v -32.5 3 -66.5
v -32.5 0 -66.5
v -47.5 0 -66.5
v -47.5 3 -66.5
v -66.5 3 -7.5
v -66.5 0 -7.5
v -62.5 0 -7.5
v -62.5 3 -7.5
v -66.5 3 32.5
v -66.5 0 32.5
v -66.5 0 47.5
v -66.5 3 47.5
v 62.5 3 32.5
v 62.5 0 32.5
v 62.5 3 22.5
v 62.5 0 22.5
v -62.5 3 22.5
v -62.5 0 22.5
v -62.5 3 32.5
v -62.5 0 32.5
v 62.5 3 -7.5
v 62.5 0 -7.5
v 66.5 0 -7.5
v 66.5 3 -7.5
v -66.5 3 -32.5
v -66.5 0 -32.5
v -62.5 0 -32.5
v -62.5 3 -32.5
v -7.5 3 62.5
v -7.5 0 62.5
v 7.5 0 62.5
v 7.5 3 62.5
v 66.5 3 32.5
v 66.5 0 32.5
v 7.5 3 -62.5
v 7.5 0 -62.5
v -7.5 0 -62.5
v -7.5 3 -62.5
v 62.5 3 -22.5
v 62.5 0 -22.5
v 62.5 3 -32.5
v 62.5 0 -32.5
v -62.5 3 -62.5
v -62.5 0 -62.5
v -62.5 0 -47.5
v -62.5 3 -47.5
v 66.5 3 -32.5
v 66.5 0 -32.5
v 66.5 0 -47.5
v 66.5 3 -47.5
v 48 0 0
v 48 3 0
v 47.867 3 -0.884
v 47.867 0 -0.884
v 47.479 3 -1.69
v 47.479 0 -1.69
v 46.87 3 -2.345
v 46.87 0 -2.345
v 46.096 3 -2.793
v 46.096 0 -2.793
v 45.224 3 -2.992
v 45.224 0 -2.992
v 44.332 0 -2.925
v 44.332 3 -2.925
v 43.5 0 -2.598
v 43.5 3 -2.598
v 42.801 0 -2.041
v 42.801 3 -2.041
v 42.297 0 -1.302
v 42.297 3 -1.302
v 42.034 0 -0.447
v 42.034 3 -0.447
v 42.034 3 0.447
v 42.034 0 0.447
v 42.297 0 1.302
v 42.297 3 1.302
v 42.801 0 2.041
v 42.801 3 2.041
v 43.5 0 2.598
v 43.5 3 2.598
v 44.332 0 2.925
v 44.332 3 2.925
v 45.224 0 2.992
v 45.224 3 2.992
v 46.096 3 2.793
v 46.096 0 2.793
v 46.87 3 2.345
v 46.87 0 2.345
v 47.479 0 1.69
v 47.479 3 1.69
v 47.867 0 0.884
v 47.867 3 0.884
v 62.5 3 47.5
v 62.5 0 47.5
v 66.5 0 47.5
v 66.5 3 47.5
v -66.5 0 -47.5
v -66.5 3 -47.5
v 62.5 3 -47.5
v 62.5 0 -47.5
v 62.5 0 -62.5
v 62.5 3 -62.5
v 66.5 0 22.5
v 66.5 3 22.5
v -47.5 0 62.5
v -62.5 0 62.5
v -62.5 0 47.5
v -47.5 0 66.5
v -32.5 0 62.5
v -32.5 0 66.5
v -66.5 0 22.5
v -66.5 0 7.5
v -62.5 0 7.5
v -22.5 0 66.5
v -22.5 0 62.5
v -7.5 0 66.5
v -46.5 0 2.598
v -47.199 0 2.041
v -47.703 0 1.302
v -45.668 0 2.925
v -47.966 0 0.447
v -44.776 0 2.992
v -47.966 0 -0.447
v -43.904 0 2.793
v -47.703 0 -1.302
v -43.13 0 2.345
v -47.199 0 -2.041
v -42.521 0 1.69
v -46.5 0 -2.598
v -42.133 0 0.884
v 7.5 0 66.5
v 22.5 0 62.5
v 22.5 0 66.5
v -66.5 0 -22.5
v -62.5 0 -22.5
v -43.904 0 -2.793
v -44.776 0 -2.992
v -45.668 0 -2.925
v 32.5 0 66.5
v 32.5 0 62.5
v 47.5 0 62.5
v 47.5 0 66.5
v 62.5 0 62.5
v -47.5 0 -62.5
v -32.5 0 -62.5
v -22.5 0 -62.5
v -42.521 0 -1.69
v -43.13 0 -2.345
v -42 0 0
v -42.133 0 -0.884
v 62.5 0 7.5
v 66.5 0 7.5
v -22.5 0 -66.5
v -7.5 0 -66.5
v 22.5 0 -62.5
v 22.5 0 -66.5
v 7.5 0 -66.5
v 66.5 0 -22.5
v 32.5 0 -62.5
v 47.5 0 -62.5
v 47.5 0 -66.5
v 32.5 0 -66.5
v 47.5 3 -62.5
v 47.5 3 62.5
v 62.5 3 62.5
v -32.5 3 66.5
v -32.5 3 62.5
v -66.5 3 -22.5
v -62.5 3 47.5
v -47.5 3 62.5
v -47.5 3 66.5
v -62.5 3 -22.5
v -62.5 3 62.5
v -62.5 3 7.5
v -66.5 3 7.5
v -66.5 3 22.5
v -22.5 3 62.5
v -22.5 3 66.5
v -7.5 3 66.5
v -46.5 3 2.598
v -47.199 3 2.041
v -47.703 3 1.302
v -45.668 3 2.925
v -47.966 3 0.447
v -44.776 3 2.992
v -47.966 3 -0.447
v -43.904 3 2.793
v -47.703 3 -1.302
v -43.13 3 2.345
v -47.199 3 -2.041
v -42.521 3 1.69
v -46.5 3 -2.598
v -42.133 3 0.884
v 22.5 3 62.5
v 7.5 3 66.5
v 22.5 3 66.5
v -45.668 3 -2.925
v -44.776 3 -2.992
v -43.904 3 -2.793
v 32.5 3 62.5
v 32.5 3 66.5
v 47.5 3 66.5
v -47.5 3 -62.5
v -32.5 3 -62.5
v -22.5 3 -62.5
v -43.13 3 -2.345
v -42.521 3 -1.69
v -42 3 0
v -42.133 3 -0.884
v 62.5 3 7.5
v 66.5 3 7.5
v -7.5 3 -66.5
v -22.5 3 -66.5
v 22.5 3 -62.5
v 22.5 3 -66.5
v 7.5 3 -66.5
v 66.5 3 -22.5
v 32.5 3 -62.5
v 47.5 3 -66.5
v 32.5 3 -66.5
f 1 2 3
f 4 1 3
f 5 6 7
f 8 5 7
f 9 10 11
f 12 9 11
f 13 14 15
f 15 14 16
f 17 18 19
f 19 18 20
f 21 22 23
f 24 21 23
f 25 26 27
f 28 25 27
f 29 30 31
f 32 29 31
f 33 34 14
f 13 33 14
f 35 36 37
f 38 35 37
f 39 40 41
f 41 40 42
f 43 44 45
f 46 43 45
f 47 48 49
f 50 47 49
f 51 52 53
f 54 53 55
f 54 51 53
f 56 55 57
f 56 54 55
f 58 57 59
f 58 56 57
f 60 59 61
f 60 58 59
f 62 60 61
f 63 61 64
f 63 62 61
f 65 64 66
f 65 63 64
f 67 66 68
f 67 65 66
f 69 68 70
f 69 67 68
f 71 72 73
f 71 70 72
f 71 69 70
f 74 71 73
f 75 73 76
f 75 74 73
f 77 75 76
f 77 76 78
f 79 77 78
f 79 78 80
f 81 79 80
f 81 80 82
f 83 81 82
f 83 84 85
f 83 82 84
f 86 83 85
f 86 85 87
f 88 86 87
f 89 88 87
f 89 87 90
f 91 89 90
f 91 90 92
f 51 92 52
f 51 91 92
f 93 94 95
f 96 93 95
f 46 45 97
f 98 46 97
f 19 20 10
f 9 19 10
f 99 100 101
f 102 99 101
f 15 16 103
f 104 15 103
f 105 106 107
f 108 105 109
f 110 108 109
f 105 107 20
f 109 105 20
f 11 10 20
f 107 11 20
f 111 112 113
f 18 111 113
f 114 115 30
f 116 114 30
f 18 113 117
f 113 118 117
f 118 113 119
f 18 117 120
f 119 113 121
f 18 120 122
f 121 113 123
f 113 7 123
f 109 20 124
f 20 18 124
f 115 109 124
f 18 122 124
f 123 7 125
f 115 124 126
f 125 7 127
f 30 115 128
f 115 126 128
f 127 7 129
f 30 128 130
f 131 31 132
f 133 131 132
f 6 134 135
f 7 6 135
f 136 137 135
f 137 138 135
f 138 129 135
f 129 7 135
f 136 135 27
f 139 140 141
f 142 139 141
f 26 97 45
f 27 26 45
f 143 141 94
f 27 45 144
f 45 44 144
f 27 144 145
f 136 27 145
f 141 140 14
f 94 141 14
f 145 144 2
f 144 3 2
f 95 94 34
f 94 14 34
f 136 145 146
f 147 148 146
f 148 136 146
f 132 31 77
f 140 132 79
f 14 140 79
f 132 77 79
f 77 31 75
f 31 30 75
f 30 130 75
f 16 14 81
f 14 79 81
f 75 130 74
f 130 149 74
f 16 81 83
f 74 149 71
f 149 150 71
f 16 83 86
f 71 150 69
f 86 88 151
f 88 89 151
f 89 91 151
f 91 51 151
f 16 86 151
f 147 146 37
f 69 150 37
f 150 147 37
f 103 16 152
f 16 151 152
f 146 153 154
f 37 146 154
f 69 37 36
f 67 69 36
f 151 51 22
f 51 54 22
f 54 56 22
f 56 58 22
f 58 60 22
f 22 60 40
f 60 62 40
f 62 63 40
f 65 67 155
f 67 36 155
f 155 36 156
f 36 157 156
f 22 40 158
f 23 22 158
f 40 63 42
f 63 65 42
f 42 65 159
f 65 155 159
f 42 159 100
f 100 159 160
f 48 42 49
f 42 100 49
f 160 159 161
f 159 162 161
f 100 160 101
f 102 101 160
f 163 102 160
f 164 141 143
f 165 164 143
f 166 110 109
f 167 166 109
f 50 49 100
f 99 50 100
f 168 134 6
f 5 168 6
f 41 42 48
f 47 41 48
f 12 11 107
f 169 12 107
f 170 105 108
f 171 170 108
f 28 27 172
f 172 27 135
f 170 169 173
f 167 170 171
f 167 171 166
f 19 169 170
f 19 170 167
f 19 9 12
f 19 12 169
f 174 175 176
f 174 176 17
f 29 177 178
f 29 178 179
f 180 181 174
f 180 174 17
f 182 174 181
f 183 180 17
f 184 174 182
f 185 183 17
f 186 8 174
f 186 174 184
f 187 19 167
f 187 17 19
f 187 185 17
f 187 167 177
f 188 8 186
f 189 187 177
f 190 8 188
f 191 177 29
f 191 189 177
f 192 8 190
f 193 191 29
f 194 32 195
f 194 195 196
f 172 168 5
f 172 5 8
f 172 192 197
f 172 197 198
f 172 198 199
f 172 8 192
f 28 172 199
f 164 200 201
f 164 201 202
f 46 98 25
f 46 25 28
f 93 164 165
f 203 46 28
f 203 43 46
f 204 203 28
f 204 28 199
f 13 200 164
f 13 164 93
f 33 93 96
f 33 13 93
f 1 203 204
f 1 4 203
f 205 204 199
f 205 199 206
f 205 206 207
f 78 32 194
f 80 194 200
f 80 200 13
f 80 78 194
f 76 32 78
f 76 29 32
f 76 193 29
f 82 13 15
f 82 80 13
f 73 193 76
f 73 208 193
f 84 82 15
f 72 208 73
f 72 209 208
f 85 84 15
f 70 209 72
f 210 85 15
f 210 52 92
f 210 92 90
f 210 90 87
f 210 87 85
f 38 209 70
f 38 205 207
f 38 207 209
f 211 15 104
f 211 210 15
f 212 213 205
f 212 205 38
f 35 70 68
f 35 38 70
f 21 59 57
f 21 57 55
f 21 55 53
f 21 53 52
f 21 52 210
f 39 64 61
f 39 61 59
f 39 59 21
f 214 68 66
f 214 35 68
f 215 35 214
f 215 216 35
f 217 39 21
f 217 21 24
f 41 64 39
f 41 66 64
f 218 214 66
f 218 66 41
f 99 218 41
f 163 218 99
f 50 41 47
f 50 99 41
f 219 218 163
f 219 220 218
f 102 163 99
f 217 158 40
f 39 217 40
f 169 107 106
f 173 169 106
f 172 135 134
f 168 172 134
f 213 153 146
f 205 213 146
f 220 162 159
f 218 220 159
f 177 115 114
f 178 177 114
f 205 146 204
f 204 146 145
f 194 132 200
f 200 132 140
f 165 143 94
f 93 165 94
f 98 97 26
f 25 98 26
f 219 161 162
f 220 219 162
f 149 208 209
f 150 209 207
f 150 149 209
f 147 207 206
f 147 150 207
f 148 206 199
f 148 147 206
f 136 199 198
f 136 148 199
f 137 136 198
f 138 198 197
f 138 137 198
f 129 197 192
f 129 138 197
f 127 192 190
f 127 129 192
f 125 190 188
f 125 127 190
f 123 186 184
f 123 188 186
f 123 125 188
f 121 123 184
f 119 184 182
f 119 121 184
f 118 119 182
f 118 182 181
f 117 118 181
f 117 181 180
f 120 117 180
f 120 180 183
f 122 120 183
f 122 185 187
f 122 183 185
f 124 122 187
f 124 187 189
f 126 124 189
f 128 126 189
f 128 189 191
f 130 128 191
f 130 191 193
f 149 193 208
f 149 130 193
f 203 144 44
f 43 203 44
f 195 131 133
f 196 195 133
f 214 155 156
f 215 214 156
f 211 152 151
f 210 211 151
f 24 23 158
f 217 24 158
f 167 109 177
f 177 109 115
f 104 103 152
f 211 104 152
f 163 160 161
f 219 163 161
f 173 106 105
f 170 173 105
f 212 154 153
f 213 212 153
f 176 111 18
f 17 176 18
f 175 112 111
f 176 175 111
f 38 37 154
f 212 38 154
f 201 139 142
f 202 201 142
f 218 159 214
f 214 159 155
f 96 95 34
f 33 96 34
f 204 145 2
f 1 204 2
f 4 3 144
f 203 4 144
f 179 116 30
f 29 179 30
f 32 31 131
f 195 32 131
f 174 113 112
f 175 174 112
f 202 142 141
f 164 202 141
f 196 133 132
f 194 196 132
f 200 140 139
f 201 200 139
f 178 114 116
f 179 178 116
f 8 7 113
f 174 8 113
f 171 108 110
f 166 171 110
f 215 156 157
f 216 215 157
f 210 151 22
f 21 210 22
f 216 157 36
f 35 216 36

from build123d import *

# Parameters (mm, degrees)
BOSS_EXTRUDE1_DEPTH = 3
SKETCH4_R           = 3
CUT_EXTRUDE2_DEPTH  = 16


with BuildPart() as part:
    # Sketch1 → Boss-Extrude1 (new body)
    with BuildSketch(Plane(origin=(0, 0, 0), x_dir=(1, 0, 0), z_dir=(0, 1, 0))):
        Polygon((7.5, -62.5), (7.5, -66.5), (22.5, -66.5), (22.5, -62.5), (32.5, -62.5), (32.5, -66.5), (47.5, -66.5), (47.5, -62.5), (57.5, -62.5), (62.5, -62.5), (62.5, -59), (62.5, -47.5), (66.5, -47.5), (66.5, -32.5), (62.5, -32.5), (62.5, -22.5), (66.5, -22.5), (66.5, -7.5), (62.5, -7.5), (62.5, 7.5), (66.5, 7.5), (66.5, 22.5), (62.5, 22.5), (62.5, 32.5), (66.5, 32.5), (66.5, 47.5), (62.5, 47.5), (62.5, 59), (62.5, 62.5), (57.5, 62.5), (47.5, 62.5), (47.5, 66.5), (32.5, 66.5), (32.5, 62.5), (22.5, 62.5), (22.5, 66.5), (7.5, 66.5), (7.5, 62.5), (-7.5, 62.5), (-7.5, 66.5), (-22.5, 66.5), (-22.5, 62.5), (-32.5, 62.5), (-32.5, 66.5), (-47.5, 66.5), (-47.5, 62.5), (-59, 62.5), (-62.5, 62.5), (-62.5, 59), (-62.5, 47.5), (-66.5, 47.5), (-66.5, 32.5), (-62.5, 32.5), (-62.5, 22.5), (-66.5, 22.5), (-66.5, 7.5), (-62.5, 7.5), (-62.5, -7.5), (-66.5, -7.5), (-66.5, -22.5), (-62.5, -22.5), (-62.5, -32.5), (-66.5, -32.5), (-66.5, -47.5), (-62.5, -47.5), (-62.5, -59), (-62.5, -62.5), (-59, -62.5), (-47.5, -62.5), (-47.5, -66.5), (-32.5, -66.5), (-32.5, -62.5), (-22.5, -62.5), (-22.5, -66.5), (-7.5, -66.5), (-7.5, -62.5), align=None)
    extrude(amount=BOSS_EXTRUDE1_DEPTH)

    # Sketch4 → Cut-Extrude2 (cut)
    with BuildSketch(Plane(origin=(0, 0, 0), x_dir=(1, 0, 0), z_dir=(0, 1, 0))):
        with Locations((-45, 0)):
            Circle(SKETCH4_R)
        with Locations((45, 0)):
            Circle(SKETCH4_R)
    extrude(amount=CUT_EXTRUDE2_DEPTH, mode=Mode.SUBTRACT)


solid = part.part
